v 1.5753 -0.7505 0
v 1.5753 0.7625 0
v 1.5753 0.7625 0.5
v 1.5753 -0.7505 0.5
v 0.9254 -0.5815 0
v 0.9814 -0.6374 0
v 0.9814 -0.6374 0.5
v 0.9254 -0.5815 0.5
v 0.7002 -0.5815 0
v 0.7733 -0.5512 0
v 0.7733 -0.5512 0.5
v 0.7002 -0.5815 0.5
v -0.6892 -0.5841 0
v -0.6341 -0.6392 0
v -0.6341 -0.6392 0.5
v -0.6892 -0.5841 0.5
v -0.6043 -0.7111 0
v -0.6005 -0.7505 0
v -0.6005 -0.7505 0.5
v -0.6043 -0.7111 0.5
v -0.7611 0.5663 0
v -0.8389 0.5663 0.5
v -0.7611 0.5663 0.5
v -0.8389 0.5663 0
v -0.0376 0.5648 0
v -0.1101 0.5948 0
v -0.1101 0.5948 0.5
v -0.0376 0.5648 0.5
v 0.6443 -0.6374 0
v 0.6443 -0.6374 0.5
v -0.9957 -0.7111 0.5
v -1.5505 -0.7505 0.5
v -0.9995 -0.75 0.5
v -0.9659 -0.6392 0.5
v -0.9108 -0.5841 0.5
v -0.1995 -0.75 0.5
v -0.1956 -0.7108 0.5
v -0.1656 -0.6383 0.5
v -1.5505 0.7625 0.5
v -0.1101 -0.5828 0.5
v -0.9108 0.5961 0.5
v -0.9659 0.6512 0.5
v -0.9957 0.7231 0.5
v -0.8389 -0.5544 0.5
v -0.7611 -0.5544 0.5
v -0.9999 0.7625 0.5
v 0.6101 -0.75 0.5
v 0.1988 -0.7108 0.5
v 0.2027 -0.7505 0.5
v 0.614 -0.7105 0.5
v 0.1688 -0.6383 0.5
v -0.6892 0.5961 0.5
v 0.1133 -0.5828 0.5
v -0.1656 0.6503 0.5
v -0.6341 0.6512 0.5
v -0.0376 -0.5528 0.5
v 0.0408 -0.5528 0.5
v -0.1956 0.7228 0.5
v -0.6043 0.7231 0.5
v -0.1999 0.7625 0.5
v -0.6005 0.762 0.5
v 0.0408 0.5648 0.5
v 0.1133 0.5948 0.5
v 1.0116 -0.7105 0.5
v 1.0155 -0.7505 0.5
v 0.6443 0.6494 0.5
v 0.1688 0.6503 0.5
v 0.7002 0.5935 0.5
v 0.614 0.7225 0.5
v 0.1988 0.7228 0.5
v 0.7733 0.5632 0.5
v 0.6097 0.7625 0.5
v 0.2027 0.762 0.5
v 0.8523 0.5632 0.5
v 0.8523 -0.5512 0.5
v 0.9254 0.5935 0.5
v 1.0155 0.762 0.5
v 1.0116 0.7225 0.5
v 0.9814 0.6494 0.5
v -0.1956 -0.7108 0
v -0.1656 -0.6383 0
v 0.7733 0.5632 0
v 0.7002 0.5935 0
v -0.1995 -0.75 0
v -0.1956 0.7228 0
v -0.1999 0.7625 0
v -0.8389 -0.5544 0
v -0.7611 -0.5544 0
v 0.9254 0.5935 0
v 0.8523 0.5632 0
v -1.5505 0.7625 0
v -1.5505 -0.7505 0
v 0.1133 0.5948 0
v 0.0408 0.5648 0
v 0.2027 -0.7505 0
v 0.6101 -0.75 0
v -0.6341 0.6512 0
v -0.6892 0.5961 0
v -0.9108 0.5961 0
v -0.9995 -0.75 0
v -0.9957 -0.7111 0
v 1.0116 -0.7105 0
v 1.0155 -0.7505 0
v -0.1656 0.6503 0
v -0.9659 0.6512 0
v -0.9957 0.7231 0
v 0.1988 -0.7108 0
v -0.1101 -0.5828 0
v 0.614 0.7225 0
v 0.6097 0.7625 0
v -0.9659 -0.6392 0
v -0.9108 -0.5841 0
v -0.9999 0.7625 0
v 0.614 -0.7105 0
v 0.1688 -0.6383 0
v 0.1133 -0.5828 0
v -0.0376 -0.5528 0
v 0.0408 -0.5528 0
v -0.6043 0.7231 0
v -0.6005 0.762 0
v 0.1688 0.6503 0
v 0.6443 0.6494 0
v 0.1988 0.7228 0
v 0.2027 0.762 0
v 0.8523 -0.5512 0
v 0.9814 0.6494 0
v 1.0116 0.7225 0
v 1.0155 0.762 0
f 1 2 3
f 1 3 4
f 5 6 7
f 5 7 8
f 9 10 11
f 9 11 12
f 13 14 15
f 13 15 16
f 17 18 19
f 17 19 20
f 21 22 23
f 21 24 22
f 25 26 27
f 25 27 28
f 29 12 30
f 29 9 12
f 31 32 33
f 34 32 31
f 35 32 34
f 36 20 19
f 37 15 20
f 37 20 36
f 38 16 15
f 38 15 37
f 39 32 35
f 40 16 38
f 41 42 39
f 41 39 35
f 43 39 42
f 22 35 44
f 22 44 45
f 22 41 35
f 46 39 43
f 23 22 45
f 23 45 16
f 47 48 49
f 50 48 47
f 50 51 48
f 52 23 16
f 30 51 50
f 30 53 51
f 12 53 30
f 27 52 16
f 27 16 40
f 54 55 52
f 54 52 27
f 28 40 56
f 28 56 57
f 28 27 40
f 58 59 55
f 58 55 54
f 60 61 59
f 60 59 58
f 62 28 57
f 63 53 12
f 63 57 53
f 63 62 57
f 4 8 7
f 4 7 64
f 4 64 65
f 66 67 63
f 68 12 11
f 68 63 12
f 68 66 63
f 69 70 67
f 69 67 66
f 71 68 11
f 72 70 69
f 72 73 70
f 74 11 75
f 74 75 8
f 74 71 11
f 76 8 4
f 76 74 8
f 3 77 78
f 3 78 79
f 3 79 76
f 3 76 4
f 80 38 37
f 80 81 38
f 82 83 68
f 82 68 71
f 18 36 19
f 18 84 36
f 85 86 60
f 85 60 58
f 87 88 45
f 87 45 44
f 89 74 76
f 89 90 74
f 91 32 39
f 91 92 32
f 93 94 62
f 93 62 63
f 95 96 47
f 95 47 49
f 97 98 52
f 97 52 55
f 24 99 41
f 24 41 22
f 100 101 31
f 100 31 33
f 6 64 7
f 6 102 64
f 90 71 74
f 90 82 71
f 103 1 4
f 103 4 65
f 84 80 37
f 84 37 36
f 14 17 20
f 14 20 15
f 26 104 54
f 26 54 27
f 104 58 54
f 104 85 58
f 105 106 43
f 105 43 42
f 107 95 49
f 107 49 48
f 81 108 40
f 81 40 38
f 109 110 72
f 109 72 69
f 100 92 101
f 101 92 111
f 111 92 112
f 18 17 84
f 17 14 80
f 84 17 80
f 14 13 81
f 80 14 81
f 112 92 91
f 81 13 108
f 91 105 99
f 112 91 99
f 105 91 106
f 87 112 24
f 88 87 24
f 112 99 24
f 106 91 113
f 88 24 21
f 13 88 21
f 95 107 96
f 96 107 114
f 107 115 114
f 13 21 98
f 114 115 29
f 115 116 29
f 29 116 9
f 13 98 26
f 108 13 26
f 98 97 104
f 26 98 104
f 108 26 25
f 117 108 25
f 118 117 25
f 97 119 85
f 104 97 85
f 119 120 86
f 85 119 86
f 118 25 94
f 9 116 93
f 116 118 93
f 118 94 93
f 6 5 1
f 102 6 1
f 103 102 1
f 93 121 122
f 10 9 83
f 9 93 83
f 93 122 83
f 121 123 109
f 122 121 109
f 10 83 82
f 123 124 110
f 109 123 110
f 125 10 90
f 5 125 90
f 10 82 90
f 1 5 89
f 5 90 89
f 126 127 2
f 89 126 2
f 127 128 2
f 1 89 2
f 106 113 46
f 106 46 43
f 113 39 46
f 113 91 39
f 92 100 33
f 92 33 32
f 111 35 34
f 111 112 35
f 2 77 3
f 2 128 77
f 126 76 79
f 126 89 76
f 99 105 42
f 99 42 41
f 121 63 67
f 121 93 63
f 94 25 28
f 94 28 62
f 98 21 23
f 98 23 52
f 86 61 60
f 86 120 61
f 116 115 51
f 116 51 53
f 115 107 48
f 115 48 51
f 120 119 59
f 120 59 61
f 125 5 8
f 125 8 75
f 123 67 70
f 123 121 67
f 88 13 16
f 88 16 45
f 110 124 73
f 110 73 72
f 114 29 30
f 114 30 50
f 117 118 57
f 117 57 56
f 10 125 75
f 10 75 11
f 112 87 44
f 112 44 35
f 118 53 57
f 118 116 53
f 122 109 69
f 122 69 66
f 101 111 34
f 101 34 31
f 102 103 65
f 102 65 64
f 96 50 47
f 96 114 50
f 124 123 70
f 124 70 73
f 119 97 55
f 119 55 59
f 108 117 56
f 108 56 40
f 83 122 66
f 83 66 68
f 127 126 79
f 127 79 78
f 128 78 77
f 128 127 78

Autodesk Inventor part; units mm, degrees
ref_plane "YZ Plane" through (0, 0, 0) normal (1, 0, 0) x (0, 1, 0)
ref_plane "XZ Plane" through (0, 0, 0) normal (0, 1, 0) x (-1, 0, 0)
ref_plane "XY Plane" through (0, 0, 0) normal (0, 0, 1) x (1, 0, 0)
sketch "CAY16, 1K_278" plane through (0, 0, 0) normal (0, 0, 1) x (1, 0, 0)
  line L0 (-1.5505, 0.7625) -> (-0.9999, 0.7625)
  line L1 (-0.9999, 0.7625) -> (-0.9997, 0.7624)
  line L2 (-0.9997, 0.7624) -> (-0.9996, 0.7623)
  line L3 (-0.9996, 0.7623) -> (-0.9995, 0.7621)
  line L4 (-0.9995, 0.7621) -> (-0.9995, 0.762)
  line L5 (-0.9995, 0.762) -> (-0.9957, 0.7231)
  line L6 (-0.9957, 0.7231) -> (-0.9659, 0.6512)
  line L7 (-0.9659, 0.6512) -> (-0.9108, 0.5961)
  line L8 (-0.9108, 0.5961) -> (-0.8389, 0.5663)
  line L9 (-0.8389, 0.5663) -> (-0.7611, 0.5663)
  line L10 (-0.7611, 0.5663) -> (-0.6892, 0.5961)
  line L11 (-0.6892, 0.5961) -> (-0.6341, 0.6512)
  line L12 (-0.6341, 0.6512) -> (-0.6043, 0.7231)
  line L13 (-0.6043, 0.7231) -> (-0.6005, 0.762)
  line L14 (-0.6005, 0.762) -> (-0.6005, 0.7621)
  line L15 (-0.6005, 0.7621) -> (-0.6004, 0.7623)
  line L16 (-0.6004, 0.7623) -> (-0.6003, 0.7624)
  line L17 (-0.6003, 0.7624) -> (-0.6001, 0.7625)
  line L18 (-0.6001, 0.7625) -> (-0.1999, 0.7625)
  line L19 (-0.1999, 0.7625) -> (-0.1997, 0.7624)
  line L20 (-0.1997, 0.7624) -> (-0.1996, 0.7623)
  line L21 (-0.1996, 0.7623) -> (-0.1995, 0.7621)
  line L22 (-0.1995, 0.7621) -> (-0.1995, 0.762)
  line L23 (-0.1995, 0.762) -> (-0.1956, 0.7228)
  line L24 (-0.1956, 0.7228) -> (-0.1656, 0.6503)
  line L25 (-0.1656, 0.6503) -> (-0.1101, 0.5948)
  line L26 (-0.1101, 0.5948) -> (-0.0376, 0.5648)
  line L27 (-0.0376, 0.5648) -> (0.0408, 0.5648)
  line L28 (0.0408, 0.5648) -> (0.1133, 0.5948)
  line L29 (0.1133, 0.5948) -> (0.1688, 0.6503)
  line L30 (0.1688, 0.6503) -> (0.1988, 0.7228)
  line L31 (0.1988, 0.7228) -> (0.2027, 0.762)
  line L32 (0.2027, 0.762) -> (0.2027, 0.7621)
  line L33 (0.2027, 0.7621) -> (0.2028, 0.7623)
  line L34 (0.2028, 0.7623) -> (0.2029, 0.7624)
  line L35 (0.2029, 0.7624) -> (0.2031, 0.7625)
  line L36 (0.2031, 0.7625) -> (0.6097, 0.7625)
  line L37 (0.6097, 0.7625) -> (0.6099, 0.7624)
  line L38 (0.6099, 0.7624) -> (0.61, 0.7623)
  line L39 (0.61, 0.7623) -> (0.6101, 0.7621)
  line L40 (0.6101, 0.7621) -> (0.6101, 0.762)
  line L41 (0.6101, 0.762) -> (0.614, 0.7225)
  line L42 (0.614, 0.7225) -> (0.6443, 0.6494)
  line L43 (0.6443, 0.6494) -> (0.7002, 0.5935)
  line L44 (0.7002, 0.5935) -> (0.7733, 0.5632)
  line L45 (0.7733, 0.5632) -> (0.8523, 0.5632)
  line L46 (0.8523, 0.5632) -> (0.9254, 0.5935)
  line L47 (0.9254, 0.5935) -> (0.9814, 0.6494)
  line L48 (0.9814, 0.6494) -> (1.0116, 0.7225)
  line L49 (1.0116, 0.7225) -> (1.0155, 0.762)
  line L50 (1.0155, 0.762) -> (1.0155, 0.7621)
  line L51 (1.0155, 0.7621) -> (1.0156, 0.7623)
  line L52 (1.0156, 0.7623) -> (1.0157, 0.7624)
  line L53 (1.0157, 0.7624) -> (1.0159, 0.7625)
  line L54 (1.0159, 0.7625) -> (1.5753, 0.7625)
  line L55 (1.5753, 0.7625) -> (1.5753, -0.7505)
  line L56 (1.5753, -0.7505) -> (1.0155, -0.7505)
  line L57 (1.0155, -0.7505) -> (1.0155, -0.75)
  line L58 (1.0155, -0.75) -> (1.0116, -0.7105)
  line L59 (1.0116, -0.7105) -> (0.9814, -0.6374)
  line L60 (0.9814, -0.6374) -> (0.9254, -0.5815)
  line L61 (0.9254, -0.5815) -> (0.8523, -0.5512)
  line L62 (0.8523, -0.5512) -> (0.7733, -0.5512)
  line L63 (0.7733, -0.5512) -> (0.7002, -0.5815)
  line L64 (0.7002, -0.5815) -> (0.6443, -0.6374)
  line L65 (0.6443, -0.6374) -> (0.614, -0.7105)
  line L66 (0.614, -0.7105) -> (0.6101, -0.75)
  line L67 (0.6101, -0.75) -> (0.6101, -0.7501)
  line L68 (0.6101, -0.7501) -> (0.61, -0.7503)
  line L69 (0.61, -0.7503) -> (0.6099, -0.7504)
  line L70 (0.6099, -0.7504) -> (0.6097, -0.7505)
  line L71 (0.6097, -0.7505) -> (0.2027, -0.7505)
  line L72 (0.2027, -0.7505) -> (0.2027, -0.75)
  line L73 (0.2027, -0.75) -> (0.1988, -0.7108)
  line L74 (0.1988, -0.7108) -> (0.1688, -0.6383)
  line L75 (0.1688, -0.6383) -> (0.1133, -0.5828)
  line L76 (0.1133, -0.5828) -> (0.0408, -0.5528)
  line L77 (0.0408, -0.5528) -> (-0.0376, -0.5528)
  line L78 (-0.0376, -0.5528) -> (-0.1101, -0.5828)
  line L79 (-0.1101, -0.5828) -> (-0.1656, -0.6383)
  line L80 (-0.1656, -0.6383) -> (-0.1956, -0.7108)
  line L81 (-0.1956, -0.7108) -> (-0.1995, -0.75)
  line L82 (-0.1995, -0.75) -> (-0.1995, -0.7501)
  line L83 (-0.1995, -0.7501) -> (-0.1996, -0.7503)
  line L84 (-0.1996, -0.7503) -> (-0.1997, -0.7504)
  line L85 (-0.1997, -0.7504) -> (-0.1999, -0.7505)
  line L86 (-0.1999, -0.7505) -> (-0.6005, -0.7505)
  line L87 (-0.6005, -0.7505) -> (-0.6005, -0.75)
  line L88 (-0.6005, -0.75) -> (-0.6043, -0.7111)
  line L89 (-0.6043, -0.7111) -> (-0.6341, -0.6392)
  line L90 (-0.6341, -0.6392) -> (-0.6892, -0.5841)
  line L91 (-0.6892, -0.5841) -> (-0.7611, -0.5544)
  line L92 (-0.7611, -0.5544) -> (-0.8389, -0.5544)
  line L93 (-0.8389, -0.5544) -> (-0.9108, -0.5841)
  line L94 (-0.9108, -0.5841) -> (-0.9659, -0.6392)
  line L95 (-0.9659, -0.6392) -> (-0.9957, -0.7111)
  line L96 (-0.9957, -0.7111) -> (-0.9995, -0.75)
  line L97 (-0.9995, -0.75) -> (-0.9995, -0.7501)
  line L98 (-0.9995, -0.7501) -> (-0.9996, -0.7503)
  line L99 (-0.9996, -0.7503) -> (-0.9997, -0.7504)
  line L100 (-0.9997, -0.7504) -> (-0.9999, -0.7505)
  line L101 (-0.9999, -0.7505) -> (-1.5505, -0.7505)
  line L102 (-1.5505, -0.7505) -> (-1.5505, 0.7625)
extrude "Extrusion1" add sketch "CAY16, 1K_278" along normal blind 0.5
properties part number "1K"
